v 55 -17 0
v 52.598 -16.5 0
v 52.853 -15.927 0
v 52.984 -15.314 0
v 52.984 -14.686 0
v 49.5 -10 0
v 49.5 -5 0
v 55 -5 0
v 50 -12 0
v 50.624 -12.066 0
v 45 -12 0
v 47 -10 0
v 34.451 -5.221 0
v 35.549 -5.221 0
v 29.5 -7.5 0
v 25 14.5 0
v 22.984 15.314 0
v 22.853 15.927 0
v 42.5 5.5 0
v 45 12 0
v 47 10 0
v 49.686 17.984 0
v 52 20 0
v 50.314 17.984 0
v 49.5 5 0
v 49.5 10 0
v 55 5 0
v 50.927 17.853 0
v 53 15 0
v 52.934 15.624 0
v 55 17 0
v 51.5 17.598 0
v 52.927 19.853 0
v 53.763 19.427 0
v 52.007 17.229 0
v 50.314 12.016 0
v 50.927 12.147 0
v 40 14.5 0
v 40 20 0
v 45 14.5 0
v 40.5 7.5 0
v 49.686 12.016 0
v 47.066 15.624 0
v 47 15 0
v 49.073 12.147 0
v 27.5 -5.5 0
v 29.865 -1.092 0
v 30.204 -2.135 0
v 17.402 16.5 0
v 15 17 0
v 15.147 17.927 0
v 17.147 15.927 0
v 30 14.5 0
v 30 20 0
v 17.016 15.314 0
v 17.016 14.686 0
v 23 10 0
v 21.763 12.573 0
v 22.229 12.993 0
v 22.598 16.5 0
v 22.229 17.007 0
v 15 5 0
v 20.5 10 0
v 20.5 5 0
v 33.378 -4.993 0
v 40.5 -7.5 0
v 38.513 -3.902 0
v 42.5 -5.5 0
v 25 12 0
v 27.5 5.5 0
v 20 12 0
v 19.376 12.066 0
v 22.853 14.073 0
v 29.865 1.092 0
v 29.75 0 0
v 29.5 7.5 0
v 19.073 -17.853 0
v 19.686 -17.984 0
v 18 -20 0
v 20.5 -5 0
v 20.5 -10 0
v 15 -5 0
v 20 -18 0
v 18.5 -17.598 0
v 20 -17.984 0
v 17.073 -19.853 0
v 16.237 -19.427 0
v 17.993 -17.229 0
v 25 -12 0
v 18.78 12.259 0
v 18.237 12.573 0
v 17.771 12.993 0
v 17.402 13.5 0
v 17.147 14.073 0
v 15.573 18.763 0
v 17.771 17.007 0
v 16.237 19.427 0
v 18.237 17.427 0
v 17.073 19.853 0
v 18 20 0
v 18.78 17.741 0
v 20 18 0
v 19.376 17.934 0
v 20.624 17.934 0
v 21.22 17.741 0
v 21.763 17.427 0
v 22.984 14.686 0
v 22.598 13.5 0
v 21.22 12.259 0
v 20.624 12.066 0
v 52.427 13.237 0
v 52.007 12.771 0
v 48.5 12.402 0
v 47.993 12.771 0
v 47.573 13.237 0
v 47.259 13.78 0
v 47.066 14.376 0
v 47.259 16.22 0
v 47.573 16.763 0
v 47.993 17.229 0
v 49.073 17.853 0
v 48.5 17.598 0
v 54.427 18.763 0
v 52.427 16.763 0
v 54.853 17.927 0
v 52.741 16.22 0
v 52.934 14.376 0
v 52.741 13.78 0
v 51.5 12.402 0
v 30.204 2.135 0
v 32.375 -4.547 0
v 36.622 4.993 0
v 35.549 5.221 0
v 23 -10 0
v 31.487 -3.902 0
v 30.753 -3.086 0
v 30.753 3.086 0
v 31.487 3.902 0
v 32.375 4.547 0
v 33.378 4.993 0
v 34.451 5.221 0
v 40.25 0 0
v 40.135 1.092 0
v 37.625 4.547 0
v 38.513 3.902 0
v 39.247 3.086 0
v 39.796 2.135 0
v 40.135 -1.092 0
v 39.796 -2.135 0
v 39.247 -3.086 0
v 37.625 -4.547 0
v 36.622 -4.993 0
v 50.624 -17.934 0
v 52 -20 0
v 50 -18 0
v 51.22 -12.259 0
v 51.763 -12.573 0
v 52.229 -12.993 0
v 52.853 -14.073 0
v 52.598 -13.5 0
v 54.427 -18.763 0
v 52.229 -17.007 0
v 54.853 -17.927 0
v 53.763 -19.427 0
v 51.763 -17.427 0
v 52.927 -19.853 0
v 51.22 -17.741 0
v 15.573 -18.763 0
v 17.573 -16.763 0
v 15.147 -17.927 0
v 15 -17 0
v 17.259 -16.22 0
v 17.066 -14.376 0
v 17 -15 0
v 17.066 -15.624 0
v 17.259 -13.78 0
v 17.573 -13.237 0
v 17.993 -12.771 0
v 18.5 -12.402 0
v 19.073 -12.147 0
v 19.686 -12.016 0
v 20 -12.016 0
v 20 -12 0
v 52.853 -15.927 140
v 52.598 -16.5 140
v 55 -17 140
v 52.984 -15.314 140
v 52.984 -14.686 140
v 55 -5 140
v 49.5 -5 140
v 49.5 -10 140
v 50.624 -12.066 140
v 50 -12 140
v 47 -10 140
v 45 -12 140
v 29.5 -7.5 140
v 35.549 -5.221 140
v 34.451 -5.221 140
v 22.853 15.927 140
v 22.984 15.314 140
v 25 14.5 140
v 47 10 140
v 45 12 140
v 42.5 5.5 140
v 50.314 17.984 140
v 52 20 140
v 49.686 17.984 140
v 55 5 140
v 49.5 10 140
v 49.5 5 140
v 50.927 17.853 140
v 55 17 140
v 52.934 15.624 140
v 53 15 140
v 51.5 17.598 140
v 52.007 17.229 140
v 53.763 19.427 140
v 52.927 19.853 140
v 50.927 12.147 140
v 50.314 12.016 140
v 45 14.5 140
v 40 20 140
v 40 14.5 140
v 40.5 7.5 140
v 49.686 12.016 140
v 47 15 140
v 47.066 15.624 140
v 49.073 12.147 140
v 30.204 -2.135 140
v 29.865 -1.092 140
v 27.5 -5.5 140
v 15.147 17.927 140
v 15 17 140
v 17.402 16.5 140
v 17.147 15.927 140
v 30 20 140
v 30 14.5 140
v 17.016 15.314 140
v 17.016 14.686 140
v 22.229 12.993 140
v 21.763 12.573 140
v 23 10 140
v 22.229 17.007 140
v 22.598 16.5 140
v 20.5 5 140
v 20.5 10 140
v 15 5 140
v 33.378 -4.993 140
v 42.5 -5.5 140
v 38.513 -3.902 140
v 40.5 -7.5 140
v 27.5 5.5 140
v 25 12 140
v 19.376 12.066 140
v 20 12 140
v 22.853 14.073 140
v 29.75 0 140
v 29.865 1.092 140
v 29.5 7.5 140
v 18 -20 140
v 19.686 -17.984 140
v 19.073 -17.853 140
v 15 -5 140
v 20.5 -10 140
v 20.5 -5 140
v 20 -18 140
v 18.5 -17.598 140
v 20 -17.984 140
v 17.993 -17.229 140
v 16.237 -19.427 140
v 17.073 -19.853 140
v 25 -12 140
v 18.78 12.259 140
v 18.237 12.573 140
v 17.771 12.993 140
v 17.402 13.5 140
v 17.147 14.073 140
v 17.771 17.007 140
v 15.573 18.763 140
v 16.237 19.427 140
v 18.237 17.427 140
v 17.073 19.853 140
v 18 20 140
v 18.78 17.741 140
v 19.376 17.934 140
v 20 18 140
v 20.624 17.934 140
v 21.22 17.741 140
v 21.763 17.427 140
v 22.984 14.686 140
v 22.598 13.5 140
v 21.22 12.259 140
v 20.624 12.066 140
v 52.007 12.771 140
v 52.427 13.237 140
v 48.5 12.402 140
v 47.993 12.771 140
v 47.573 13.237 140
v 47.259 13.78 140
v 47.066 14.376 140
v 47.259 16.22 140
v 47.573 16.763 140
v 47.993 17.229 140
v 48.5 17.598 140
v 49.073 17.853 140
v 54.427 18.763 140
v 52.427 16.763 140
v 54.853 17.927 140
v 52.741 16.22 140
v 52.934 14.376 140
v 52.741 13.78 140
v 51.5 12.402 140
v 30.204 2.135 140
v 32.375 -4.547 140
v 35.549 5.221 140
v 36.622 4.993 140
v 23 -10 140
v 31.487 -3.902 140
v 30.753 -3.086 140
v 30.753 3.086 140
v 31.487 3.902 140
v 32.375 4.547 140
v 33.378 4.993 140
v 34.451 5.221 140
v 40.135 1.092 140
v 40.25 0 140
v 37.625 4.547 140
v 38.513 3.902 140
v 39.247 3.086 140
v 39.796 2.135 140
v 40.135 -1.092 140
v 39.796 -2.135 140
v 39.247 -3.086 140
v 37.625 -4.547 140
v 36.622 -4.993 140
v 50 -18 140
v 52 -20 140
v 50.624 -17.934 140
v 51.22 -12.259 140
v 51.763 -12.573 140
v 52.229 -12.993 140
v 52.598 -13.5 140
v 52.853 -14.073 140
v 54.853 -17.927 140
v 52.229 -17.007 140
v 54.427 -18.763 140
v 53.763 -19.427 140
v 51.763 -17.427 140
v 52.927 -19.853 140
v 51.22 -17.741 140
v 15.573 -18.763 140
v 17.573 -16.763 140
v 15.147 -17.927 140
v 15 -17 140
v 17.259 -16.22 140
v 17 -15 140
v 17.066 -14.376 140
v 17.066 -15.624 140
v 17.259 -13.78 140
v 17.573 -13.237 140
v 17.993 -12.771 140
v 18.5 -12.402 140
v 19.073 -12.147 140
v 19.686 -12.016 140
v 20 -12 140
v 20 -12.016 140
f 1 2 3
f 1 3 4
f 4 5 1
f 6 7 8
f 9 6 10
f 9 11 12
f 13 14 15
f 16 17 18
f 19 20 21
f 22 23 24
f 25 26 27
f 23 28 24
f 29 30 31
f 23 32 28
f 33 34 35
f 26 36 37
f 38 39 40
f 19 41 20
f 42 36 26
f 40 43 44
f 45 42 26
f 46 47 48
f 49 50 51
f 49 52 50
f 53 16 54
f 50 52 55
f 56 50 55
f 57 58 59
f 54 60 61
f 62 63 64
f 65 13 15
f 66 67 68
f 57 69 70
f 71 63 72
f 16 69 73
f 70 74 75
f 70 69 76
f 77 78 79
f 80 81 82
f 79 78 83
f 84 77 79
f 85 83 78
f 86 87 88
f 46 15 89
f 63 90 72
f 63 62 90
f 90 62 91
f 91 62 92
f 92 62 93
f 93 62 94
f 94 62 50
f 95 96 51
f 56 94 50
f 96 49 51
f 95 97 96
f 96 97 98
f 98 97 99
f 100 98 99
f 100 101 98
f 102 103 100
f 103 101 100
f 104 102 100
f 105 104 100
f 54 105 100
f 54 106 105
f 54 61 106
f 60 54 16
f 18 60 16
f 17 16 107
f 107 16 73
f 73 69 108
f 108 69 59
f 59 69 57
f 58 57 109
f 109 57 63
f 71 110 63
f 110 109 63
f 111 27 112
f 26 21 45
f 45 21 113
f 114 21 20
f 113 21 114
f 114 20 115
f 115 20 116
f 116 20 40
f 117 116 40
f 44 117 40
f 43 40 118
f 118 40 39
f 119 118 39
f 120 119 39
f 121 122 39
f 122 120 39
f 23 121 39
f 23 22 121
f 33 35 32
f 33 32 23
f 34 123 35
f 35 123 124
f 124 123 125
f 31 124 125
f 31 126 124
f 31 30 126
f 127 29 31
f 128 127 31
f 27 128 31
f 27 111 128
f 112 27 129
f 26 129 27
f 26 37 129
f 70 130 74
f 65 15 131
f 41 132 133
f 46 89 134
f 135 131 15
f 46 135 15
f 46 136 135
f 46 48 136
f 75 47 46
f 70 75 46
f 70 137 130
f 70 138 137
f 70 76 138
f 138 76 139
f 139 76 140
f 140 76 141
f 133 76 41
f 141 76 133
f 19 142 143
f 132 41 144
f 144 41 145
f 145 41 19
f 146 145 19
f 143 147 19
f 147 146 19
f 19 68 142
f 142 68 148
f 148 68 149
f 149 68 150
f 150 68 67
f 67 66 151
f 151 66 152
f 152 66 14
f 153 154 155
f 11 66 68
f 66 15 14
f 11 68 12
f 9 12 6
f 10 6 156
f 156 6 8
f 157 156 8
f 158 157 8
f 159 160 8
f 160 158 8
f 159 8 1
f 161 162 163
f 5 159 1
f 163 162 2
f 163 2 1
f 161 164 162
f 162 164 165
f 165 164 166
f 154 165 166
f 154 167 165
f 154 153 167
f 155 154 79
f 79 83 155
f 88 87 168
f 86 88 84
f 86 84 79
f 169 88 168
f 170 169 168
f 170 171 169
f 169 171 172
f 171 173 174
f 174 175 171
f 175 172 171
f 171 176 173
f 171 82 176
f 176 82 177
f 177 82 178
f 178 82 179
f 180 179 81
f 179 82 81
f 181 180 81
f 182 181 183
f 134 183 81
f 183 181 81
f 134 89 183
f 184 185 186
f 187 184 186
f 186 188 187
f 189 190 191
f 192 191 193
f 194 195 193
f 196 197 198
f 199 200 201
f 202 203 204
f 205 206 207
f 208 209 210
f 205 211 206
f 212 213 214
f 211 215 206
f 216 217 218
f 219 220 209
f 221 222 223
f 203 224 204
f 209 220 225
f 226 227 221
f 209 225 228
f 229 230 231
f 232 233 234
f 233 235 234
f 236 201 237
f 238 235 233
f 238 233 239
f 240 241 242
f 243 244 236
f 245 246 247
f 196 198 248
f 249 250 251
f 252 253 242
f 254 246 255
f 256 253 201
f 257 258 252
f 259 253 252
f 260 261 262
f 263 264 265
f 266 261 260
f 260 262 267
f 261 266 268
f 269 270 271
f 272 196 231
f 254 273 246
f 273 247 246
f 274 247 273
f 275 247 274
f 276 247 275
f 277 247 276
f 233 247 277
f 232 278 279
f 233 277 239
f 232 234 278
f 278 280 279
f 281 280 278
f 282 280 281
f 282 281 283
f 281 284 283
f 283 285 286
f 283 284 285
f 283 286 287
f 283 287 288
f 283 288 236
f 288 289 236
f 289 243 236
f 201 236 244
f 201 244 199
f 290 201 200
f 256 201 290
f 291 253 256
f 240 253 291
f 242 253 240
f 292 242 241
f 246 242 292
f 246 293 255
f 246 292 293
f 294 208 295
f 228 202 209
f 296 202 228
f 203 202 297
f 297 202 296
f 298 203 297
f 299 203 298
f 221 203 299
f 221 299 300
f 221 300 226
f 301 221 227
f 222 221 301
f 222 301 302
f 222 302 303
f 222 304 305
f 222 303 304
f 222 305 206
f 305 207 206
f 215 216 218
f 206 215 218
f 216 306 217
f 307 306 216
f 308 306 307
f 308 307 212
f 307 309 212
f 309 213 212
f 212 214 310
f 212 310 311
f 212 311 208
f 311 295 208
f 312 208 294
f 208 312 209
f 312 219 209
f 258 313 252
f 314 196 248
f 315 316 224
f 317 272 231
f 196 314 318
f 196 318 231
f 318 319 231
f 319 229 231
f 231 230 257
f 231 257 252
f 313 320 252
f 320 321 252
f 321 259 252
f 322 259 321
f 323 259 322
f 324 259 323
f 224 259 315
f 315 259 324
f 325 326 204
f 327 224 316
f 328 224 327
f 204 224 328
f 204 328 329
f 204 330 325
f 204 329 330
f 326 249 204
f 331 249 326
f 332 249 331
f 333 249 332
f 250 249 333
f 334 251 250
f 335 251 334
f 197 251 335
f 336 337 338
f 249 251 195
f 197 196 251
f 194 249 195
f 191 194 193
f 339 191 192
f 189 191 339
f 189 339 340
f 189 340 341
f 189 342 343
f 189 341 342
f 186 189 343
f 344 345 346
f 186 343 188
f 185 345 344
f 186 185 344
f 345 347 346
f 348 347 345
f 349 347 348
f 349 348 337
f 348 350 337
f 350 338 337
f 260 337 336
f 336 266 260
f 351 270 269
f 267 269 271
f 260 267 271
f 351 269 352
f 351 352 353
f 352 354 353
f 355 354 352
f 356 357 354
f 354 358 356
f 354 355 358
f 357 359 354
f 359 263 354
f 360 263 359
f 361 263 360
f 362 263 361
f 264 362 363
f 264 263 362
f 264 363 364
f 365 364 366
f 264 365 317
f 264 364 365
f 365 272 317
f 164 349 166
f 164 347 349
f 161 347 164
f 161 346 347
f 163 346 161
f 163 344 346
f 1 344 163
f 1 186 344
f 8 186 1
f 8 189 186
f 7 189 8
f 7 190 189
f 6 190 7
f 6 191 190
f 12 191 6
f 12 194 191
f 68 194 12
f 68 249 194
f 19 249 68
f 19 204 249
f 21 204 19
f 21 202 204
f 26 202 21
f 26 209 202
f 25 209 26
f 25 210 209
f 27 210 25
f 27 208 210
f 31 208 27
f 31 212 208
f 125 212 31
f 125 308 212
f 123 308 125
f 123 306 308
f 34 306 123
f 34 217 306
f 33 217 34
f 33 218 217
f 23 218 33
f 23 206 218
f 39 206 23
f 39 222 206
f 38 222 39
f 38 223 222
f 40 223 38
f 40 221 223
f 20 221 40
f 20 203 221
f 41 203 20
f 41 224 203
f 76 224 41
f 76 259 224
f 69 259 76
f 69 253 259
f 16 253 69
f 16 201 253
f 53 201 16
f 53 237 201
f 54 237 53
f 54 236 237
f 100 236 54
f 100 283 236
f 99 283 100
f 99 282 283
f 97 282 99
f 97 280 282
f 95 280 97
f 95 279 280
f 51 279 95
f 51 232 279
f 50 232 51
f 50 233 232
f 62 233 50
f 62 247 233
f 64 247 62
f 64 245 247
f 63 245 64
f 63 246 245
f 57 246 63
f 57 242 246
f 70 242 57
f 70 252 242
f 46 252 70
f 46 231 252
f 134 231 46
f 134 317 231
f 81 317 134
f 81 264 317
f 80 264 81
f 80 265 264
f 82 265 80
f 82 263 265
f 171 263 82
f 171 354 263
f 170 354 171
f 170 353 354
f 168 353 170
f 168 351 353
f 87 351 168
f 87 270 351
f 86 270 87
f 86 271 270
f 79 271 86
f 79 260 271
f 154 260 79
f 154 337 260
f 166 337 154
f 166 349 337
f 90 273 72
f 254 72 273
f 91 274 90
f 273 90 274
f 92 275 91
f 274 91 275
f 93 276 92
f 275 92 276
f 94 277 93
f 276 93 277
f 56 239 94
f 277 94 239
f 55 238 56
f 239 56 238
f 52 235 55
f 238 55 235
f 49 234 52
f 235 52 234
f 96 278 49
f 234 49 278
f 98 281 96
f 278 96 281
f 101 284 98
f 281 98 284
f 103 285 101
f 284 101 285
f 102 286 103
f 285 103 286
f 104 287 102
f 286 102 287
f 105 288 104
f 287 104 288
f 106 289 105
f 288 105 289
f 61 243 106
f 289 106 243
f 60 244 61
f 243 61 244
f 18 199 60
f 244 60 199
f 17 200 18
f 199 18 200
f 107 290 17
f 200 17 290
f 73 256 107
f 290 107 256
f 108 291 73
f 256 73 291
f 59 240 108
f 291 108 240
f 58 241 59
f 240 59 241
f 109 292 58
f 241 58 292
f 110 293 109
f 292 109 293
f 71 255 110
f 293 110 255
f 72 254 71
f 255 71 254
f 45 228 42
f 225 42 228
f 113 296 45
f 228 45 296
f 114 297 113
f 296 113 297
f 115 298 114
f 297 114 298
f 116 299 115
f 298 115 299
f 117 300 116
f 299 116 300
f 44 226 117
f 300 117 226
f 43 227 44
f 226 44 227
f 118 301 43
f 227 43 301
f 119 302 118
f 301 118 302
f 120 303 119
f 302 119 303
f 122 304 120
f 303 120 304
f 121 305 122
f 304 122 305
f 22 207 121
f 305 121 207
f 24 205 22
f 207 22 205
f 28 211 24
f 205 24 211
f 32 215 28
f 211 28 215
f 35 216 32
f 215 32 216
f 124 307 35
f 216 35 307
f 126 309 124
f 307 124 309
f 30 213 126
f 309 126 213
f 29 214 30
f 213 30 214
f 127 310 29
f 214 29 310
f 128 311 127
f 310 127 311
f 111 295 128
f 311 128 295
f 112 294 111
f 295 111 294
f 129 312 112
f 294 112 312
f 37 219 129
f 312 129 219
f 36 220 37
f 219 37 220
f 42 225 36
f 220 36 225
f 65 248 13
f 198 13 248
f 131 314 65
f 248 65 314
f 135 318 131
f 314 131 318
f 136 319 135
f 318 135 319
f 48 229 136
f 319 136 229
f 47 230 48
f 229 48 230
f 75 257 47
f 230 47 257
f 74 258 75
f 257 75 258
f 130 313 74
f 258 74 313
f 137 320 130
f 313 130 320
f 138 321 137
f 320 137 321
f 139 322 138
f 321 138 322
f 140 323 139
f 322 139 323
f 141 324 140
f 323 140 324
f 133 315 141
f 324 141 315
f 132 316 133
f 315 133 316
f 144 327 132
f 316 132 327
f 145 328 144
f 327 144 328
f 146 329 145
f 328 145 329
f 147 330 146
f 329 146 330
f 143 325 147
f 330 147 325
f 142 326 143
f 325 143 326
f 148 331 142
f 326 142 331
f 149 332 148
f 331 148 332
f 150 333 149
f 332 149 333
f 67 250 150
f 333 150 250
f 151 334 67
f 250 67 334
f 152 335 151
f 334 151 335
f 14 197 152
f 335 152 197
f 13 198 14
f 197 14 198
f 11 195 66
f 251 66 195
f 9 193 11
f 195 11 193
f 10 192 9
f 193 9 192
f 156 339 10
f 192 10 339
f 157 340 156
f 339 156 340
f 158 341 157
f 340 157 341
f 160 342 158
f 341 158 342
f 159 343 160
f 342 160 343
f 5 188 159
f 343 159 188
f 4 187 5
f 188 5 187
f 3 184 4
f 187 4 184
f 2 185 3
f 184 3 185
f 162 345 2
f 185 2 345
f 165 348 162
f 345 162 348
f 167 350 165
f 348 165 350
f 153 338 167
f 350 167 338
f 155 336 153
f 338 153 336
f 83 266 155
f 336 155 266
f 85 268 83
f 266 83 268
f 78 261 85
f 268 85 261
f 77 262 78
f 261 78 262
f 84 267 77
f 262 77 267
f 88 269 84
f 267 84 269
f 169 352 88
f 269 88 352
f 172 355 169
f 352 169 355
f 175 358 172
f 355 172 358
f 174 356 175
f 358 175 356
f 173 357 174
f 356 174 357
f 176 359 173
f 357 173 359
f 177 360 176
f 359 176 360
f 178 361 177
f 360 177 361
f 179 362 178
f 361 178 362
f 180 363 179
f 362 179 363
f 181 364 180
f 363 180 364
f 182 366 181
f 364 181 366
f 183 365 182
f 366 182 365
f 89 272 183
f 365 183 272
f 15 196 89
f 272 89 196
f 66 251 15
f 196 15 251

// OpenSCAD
linear_extrude(100) ex_face(20,5);
!translate([35,0]) linear_extrude(140) ex_face(40,8,3,3);

module ex_face(size=30,type=6,r=2,sides=4)
{
  hole1s=(type==6?6.8:(type==5?4.2:(type==8?10.5:type)));
  hole2s=(type==6?3:type==8?6:5);
  difference(){
    translate([size*-.5+r,size*-.5+r]) minkowski(){
      square(size-r*2);
      circle(r=r,$fn=20);
    }
    if(type>5) for(r=[0:90:359]) rotate([0,0,r]) translate([size*.5-hole2s/2-2,size*.5-hole2s/2-2]) circle(d=hole2s,$fn=30);
    circle(d=hole1s,$fn=30);
    for(rot=sides==4?[]:(sides==3?[0]:(sides==2?[0,2]:[0]))) rotate([0,0,rot*90]) {
      if(type==8)
        translate([-15,-18]) square([30,hole2s]);
    }
    difference() {
      for(rot=[0:3]) rotate([0,0,rot*90]) {
   //translate([size*-.5+3.4,size*-.5+3.4]) circle(d=2,$fn=16);
       if(type==6)
        polygon([[-4,-15],[-4,-13],[-8.25,-13],[-8.25,-10],[-4.25,-6],[4.25,-6],[8.25,-10],[8.25,-13],[4,-13],[4,-15.01]]);
       else if(type==8)
         polygon([[-5,-20],[-5,-14.5],[-10,-14.5],[-10,-12],[-5.5,-7.5],[5.5,-7.5],[10,-12],[10,-14.5],[5,-14.5],[5,-20]]);
       else
         polygon([[-3,size*-.5],[-3,size*-.5+2],[-6,size*-.5+2],[-6,size*-.5+3],[-2,size*-.5+6],[2,size*-.5+6],[6,size*-.5+3],[6,size*-.5+2],[3,size*-.5+2],[3,size*-.5]]);
     }
 for(rot=sides==4?[]:(sides==3?[0]:(sides==2?[0,2]:[0]))) rotate([0,0,rot*90]) {
   if(type==8)
       translate([-5,-20]) square([10,5.5]);
   }
    }
  }
}
